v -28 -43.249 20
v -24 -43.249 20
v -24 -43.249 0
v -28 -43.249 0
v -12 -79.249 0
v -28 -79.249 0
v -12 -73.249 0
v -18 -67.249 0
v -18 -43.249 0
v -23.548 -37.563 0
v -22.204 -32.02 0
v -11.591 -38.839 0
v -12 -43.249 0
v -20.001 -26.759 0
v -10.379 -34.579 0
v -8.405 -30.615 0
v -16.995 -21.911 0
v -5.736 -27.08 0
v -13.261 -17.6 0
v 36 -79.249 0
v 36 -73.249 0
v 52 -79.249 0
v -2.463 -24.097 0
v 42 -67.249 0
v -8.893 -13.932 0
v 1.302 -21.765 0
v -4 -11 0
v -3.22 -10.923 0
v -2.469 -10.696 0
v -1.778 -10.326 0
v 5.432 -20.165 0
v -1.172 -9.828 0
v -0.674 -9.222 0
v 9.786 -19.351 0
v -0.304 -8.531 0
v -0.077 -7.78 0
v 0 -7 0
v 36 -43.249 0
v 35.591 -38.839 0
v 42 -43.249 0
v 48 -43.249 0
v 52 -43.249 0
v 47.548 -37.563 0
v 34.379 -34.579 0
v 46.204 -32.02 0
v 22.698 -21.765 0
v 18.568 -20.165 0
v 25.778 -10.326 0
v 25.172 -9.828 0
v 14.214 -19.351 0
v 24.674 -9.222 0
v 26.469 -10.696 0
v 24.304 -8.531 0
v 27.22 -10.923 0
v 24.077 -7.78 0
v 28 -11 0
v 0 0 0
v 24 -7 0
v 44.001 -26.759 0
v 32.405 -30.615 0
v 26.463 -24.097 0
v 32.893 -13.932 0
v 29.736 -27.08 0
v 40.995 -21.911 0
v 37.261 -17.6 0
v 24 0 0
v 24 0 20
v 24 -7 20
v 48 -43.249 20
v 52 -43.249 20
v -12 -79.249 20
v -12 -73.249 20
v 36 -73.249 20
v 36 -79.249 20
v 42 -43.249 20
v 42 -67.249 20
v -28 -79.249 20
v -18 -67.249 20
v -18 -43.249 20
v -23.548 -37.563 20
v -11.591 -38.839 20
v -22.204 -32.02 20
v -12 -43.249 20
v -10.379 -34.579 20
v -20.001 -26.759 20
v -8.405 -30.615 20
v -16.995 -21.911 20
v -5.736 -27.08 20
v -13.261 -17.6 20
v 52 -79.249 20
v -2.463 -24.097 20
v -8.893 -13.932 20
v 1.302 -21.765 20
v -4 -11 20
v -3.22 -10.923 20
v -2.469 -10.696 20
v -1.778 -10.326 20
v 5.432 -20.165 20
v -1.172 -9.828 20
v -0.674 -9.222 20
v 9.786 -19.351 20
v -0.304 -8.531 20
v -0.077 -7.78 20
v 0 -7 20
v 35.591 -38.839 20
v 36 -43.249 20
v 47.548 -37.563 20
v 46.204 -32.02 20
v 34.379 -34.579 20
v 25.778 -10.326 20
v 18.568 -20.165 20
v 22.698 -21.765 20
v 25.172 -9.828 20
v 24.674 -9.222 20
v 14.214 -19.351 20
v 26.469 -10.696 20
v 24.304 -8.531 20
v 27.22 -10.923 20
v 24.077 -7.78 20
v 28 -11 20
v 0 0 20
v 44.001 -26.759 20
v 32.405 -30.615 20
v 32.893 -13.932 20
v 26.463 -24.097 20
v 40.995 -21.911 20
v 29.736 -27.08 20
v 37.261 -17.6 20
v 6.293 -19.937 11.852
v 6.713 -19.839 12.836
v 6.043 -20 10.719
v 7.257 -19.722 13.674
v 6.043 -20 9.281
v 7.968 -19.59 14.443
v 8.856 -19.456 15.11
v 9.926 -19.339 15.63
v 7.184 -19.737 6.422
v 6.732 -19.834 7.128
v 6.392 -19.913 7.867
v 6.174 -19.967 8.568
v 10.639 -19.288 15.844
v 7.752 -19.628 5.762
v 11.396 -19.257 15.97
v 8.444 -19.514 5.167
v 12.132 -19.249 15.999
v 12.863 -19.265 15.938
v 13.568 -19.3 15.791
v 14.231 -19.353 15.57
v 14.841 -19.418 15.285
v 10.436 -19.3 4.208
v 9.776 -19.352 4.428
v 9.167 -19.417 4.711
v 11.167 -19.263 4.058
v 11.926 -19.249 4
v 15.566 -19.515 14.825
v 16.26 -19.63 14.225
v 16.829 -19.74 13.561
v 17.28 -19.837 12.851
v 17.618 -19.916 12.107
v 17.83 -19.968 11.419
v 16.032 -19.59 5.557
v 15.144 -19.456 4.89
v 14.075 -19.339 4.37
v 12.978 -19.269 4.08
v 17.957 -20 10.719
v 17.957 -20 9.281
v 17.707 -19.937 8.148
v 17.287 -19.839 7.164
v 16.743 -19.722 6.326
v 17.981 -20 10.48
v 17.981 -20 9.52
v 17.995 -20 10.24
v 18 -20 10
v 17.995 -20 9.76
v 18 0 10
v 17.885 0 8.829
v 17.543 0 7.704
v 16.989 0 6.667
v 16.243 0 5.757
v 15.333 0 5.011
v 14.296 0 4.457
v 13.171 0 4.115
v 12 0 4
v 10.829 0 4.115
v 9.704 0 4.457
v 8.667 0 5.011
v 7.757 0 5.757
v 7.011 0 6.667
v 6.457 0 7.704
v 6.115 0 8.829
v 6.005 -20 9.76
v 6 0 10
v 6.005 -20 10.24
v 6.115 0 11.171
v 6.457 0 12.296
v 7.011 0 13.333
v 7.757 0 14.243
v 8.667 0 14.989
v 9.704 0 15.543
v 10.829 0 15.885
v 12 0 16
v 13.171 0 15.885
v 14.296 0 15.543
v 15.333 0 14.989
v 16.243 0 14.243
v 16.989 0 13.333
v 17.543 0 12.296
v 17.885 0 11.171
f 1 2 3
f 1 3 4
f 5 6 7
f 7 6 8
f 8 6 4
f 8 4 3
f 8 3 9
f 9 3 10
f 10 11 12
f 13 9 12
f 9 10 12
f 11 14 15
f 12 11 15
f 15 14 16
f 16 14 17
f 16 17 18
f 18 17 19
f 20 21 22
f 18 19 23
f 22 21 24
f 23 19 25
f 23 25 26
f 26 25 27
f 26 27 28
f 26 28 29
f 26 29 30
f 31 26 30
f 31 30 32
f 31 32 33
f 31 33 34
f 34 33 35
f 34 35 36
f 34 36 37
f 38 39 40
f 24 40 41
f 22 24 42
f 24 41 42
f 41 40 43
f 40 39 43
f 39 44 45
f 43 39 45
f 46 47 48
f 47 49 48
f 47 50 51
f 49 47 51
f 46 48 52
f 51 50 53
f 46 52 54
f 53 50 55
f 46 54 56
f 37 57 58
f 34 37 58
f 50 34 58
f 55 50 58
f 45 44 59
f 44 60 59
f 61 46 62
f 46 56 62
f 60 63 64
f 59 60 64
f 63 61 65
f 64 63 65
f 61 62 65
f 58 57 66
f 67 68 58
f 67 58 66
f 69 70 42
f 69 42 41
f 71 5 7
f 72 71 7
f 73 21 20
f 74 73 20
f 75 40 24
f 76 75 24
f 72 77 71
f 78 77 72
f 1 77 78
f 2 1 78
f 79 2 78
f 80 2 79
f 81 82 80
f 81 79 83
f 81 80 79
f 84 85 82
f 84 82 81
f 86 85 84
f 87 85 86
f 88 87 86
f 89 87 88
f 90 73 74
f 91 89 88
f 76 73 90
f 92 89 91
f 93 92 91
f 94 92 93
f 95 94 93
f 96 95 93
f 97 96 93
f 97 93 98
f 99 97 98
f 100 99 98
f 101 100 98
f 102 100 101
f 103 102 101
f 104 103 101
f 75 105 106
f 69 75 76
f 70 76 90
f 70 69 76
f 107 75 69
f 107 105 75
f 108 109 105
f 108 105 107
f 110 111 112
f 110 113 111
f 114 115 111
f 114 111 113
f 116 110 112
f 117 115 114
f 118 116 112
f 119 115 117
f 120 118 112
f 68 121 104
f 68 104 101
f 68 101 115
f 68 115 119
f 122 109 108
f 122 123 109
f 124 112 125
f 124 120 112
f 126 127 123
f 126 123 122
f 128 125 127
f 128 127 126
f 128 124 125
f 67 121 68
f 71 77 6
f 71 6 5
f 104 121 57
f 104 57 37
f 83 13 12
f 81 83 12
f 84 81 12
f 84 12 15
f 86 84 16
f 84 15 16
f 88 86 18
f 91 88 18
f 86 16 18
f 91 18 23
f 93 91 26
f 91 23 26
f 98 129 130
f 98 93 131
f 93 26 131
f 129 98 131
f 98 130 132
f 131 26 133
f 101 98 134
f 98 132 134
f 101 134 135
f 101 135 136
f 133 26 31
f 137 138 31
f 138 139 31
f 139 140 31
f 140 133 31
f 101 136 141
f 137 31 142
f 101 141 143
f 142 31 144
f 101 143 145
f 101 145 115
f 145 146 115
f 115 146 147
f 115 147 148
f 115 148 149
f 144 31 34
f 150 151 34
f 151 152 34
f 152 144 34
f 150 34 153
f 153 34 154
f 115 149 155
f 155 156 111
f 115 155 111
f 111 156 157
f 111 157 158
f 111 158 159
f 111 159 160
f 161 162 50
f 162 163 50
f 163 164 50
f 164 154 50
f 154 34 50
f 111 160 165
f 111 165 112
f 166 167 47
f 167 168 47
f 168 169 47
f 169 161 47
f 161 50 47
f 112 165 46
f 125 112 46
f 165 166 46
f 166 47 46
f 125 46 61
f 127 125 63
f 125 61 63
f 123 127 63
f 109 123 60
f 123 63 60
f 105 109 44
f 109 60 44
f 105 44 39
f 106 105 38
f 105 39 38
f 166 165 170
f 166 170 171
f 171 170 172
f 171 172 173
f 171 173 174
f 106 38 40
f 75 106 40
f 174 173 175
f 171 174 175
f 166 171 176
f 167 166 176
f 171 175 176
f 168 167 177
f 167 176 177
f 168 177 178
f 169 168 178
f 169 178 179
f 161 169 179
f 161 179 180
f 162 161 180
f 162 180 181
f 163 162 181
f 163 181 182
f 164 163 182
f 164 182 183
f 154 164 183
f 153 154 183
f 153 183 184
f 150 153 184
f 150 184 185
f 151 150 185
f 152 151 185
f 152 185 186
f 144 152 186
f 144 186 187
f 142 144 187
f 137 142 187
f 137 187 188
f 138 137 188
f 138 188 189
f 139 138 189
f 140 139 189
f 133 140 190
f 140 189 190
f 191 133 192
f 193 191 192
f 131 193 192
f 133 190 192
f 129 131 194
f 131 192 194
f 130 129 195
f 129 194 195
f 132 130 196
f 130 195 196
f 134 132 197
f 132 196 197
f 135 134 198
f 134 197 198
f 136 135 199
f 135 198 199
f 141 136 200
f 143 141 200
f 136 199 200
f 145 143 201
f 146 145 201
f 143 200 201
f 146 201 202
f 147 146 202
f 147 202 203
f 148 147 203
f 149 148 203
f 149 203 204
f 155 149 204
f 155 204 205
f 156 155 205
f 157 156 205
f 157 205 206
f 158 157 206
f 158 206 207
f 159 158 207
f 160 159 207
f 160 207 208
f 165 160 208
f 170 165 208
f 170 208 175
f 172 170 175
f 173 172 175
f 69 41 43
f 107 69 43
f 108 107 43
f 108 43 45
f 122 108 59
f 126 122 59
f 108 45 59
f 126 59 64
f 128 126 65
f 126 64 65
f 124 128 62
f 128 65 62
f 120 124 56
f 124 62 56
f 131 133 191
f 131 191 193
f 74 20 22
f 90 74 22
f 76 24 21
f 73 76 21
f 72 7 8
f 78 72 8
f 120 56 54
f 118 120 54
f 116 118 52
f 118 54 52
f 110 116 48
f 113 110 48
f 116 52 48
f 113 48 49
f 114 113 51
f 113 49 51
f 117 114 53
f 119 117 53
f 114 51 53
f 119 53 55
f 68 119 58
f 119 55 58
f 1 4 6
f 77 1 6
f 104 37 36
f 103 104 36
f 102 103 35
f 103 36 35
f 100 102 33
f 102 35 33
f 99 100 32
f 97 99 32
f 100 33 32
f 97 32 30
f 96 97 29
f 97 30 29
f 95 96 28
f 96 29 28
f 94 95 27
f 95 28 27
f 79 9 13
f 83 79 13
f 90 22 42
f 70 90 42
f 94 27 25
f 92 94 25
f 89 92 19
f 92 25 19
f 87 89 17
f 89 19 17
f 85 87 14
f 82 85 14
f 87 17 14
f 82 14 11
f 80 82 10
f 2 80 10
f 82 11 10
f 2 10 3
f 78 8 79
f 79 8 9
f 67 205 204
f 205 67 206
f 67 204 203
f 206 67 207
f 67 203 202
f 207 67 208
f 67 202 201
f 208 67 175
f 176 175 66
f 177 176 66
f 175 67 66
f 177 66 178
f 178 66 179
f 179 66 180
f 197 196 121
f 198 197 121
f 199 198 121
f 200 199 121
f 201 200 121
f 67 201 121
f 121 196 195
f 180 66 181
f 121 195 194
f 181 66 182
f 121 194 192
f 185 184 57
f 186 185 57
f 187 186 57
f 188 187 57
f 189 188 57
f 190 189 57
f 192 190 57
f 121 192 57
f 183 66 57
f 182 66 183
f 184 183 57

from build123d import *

# Parameters (mm, degrees)
BOSS_EXTRUDE1_DEPTH = 20
SKETCH2_R           = 6
CUT_EXTRUDE1_DEPTH  = 20


with BuildPart() as part:
    # Sketch1 → Boss-Extrude1 (new body)
    with BuildSketch(Plane.XY):
        with BuildLine():
            Line((0, 0), (0, -7))
            ThreePointArc((0, -7), (-1.171572875, -9.828427125), (-4, -11))
            ThreePointArc((-4, -11), (-18.594117082, -24.275365032), (-24, -43.249030993))
            Line((-24, -43.249030993), (-28, -43.249030993))
            Line((-28, -43.249030993), (-28, -79.249030993))
            Line((-28, -79.249030993), (-12, -79.249030993))
            Line((-12, -79.249030993), (-12, -73.249030993))
            Line((-12, -73.249030993), (-18, -67.249030993))
            Line((-18, -67.249030993), (-18, -43.249030993))
            Line((-18, -43.249030993), (-12, -43.249030993))
            ThreePointArc((-12, -43.249030993), (12, -19.249030993), (36, -43.249030993))
            Line((36, -43.249030993), (42, -43.249030993))
            Line((42, -43.249030993), (42, -67.249030993))
            Line((42, -67.249030993), (36, -73.249030993))
            Line((36, -73.249030993), (36, -79.249030993))
            Line((36, -79.249030993), (52, -79.249030993))
            Line((52, -79.249030993), (52, -43.249030993))
            Line((52, -43.249030993), (48, -43.249030993))
            ThreePointArc((48, -43.249030993), (42.594117082, -24.275365032), (28, -11))
            ThreePointArc((28, -11), (25.171572875, -9.828427125), (24, -7))
            Line((24, -7), (24, 0))
            Line((24, 0), (0, 0))
        make_face()
    extrude(amount=BOSS_EXTRUDE1_DEPTH)

    # Sketch2 → Cut-Extrude1 (cut)
    with BuildSketch(Plane(origin=(0, 0, 0), x_dir=(1, 0, 0), z_dir=(0, 1, 0))):
        with Locations((12, -10)):
            Circle(SKETCH2_R)
    extrude(amount=-CUT_EXTRUDE1_DEPTH, mode=Mode.SUBTRACT)


solid = part.part
